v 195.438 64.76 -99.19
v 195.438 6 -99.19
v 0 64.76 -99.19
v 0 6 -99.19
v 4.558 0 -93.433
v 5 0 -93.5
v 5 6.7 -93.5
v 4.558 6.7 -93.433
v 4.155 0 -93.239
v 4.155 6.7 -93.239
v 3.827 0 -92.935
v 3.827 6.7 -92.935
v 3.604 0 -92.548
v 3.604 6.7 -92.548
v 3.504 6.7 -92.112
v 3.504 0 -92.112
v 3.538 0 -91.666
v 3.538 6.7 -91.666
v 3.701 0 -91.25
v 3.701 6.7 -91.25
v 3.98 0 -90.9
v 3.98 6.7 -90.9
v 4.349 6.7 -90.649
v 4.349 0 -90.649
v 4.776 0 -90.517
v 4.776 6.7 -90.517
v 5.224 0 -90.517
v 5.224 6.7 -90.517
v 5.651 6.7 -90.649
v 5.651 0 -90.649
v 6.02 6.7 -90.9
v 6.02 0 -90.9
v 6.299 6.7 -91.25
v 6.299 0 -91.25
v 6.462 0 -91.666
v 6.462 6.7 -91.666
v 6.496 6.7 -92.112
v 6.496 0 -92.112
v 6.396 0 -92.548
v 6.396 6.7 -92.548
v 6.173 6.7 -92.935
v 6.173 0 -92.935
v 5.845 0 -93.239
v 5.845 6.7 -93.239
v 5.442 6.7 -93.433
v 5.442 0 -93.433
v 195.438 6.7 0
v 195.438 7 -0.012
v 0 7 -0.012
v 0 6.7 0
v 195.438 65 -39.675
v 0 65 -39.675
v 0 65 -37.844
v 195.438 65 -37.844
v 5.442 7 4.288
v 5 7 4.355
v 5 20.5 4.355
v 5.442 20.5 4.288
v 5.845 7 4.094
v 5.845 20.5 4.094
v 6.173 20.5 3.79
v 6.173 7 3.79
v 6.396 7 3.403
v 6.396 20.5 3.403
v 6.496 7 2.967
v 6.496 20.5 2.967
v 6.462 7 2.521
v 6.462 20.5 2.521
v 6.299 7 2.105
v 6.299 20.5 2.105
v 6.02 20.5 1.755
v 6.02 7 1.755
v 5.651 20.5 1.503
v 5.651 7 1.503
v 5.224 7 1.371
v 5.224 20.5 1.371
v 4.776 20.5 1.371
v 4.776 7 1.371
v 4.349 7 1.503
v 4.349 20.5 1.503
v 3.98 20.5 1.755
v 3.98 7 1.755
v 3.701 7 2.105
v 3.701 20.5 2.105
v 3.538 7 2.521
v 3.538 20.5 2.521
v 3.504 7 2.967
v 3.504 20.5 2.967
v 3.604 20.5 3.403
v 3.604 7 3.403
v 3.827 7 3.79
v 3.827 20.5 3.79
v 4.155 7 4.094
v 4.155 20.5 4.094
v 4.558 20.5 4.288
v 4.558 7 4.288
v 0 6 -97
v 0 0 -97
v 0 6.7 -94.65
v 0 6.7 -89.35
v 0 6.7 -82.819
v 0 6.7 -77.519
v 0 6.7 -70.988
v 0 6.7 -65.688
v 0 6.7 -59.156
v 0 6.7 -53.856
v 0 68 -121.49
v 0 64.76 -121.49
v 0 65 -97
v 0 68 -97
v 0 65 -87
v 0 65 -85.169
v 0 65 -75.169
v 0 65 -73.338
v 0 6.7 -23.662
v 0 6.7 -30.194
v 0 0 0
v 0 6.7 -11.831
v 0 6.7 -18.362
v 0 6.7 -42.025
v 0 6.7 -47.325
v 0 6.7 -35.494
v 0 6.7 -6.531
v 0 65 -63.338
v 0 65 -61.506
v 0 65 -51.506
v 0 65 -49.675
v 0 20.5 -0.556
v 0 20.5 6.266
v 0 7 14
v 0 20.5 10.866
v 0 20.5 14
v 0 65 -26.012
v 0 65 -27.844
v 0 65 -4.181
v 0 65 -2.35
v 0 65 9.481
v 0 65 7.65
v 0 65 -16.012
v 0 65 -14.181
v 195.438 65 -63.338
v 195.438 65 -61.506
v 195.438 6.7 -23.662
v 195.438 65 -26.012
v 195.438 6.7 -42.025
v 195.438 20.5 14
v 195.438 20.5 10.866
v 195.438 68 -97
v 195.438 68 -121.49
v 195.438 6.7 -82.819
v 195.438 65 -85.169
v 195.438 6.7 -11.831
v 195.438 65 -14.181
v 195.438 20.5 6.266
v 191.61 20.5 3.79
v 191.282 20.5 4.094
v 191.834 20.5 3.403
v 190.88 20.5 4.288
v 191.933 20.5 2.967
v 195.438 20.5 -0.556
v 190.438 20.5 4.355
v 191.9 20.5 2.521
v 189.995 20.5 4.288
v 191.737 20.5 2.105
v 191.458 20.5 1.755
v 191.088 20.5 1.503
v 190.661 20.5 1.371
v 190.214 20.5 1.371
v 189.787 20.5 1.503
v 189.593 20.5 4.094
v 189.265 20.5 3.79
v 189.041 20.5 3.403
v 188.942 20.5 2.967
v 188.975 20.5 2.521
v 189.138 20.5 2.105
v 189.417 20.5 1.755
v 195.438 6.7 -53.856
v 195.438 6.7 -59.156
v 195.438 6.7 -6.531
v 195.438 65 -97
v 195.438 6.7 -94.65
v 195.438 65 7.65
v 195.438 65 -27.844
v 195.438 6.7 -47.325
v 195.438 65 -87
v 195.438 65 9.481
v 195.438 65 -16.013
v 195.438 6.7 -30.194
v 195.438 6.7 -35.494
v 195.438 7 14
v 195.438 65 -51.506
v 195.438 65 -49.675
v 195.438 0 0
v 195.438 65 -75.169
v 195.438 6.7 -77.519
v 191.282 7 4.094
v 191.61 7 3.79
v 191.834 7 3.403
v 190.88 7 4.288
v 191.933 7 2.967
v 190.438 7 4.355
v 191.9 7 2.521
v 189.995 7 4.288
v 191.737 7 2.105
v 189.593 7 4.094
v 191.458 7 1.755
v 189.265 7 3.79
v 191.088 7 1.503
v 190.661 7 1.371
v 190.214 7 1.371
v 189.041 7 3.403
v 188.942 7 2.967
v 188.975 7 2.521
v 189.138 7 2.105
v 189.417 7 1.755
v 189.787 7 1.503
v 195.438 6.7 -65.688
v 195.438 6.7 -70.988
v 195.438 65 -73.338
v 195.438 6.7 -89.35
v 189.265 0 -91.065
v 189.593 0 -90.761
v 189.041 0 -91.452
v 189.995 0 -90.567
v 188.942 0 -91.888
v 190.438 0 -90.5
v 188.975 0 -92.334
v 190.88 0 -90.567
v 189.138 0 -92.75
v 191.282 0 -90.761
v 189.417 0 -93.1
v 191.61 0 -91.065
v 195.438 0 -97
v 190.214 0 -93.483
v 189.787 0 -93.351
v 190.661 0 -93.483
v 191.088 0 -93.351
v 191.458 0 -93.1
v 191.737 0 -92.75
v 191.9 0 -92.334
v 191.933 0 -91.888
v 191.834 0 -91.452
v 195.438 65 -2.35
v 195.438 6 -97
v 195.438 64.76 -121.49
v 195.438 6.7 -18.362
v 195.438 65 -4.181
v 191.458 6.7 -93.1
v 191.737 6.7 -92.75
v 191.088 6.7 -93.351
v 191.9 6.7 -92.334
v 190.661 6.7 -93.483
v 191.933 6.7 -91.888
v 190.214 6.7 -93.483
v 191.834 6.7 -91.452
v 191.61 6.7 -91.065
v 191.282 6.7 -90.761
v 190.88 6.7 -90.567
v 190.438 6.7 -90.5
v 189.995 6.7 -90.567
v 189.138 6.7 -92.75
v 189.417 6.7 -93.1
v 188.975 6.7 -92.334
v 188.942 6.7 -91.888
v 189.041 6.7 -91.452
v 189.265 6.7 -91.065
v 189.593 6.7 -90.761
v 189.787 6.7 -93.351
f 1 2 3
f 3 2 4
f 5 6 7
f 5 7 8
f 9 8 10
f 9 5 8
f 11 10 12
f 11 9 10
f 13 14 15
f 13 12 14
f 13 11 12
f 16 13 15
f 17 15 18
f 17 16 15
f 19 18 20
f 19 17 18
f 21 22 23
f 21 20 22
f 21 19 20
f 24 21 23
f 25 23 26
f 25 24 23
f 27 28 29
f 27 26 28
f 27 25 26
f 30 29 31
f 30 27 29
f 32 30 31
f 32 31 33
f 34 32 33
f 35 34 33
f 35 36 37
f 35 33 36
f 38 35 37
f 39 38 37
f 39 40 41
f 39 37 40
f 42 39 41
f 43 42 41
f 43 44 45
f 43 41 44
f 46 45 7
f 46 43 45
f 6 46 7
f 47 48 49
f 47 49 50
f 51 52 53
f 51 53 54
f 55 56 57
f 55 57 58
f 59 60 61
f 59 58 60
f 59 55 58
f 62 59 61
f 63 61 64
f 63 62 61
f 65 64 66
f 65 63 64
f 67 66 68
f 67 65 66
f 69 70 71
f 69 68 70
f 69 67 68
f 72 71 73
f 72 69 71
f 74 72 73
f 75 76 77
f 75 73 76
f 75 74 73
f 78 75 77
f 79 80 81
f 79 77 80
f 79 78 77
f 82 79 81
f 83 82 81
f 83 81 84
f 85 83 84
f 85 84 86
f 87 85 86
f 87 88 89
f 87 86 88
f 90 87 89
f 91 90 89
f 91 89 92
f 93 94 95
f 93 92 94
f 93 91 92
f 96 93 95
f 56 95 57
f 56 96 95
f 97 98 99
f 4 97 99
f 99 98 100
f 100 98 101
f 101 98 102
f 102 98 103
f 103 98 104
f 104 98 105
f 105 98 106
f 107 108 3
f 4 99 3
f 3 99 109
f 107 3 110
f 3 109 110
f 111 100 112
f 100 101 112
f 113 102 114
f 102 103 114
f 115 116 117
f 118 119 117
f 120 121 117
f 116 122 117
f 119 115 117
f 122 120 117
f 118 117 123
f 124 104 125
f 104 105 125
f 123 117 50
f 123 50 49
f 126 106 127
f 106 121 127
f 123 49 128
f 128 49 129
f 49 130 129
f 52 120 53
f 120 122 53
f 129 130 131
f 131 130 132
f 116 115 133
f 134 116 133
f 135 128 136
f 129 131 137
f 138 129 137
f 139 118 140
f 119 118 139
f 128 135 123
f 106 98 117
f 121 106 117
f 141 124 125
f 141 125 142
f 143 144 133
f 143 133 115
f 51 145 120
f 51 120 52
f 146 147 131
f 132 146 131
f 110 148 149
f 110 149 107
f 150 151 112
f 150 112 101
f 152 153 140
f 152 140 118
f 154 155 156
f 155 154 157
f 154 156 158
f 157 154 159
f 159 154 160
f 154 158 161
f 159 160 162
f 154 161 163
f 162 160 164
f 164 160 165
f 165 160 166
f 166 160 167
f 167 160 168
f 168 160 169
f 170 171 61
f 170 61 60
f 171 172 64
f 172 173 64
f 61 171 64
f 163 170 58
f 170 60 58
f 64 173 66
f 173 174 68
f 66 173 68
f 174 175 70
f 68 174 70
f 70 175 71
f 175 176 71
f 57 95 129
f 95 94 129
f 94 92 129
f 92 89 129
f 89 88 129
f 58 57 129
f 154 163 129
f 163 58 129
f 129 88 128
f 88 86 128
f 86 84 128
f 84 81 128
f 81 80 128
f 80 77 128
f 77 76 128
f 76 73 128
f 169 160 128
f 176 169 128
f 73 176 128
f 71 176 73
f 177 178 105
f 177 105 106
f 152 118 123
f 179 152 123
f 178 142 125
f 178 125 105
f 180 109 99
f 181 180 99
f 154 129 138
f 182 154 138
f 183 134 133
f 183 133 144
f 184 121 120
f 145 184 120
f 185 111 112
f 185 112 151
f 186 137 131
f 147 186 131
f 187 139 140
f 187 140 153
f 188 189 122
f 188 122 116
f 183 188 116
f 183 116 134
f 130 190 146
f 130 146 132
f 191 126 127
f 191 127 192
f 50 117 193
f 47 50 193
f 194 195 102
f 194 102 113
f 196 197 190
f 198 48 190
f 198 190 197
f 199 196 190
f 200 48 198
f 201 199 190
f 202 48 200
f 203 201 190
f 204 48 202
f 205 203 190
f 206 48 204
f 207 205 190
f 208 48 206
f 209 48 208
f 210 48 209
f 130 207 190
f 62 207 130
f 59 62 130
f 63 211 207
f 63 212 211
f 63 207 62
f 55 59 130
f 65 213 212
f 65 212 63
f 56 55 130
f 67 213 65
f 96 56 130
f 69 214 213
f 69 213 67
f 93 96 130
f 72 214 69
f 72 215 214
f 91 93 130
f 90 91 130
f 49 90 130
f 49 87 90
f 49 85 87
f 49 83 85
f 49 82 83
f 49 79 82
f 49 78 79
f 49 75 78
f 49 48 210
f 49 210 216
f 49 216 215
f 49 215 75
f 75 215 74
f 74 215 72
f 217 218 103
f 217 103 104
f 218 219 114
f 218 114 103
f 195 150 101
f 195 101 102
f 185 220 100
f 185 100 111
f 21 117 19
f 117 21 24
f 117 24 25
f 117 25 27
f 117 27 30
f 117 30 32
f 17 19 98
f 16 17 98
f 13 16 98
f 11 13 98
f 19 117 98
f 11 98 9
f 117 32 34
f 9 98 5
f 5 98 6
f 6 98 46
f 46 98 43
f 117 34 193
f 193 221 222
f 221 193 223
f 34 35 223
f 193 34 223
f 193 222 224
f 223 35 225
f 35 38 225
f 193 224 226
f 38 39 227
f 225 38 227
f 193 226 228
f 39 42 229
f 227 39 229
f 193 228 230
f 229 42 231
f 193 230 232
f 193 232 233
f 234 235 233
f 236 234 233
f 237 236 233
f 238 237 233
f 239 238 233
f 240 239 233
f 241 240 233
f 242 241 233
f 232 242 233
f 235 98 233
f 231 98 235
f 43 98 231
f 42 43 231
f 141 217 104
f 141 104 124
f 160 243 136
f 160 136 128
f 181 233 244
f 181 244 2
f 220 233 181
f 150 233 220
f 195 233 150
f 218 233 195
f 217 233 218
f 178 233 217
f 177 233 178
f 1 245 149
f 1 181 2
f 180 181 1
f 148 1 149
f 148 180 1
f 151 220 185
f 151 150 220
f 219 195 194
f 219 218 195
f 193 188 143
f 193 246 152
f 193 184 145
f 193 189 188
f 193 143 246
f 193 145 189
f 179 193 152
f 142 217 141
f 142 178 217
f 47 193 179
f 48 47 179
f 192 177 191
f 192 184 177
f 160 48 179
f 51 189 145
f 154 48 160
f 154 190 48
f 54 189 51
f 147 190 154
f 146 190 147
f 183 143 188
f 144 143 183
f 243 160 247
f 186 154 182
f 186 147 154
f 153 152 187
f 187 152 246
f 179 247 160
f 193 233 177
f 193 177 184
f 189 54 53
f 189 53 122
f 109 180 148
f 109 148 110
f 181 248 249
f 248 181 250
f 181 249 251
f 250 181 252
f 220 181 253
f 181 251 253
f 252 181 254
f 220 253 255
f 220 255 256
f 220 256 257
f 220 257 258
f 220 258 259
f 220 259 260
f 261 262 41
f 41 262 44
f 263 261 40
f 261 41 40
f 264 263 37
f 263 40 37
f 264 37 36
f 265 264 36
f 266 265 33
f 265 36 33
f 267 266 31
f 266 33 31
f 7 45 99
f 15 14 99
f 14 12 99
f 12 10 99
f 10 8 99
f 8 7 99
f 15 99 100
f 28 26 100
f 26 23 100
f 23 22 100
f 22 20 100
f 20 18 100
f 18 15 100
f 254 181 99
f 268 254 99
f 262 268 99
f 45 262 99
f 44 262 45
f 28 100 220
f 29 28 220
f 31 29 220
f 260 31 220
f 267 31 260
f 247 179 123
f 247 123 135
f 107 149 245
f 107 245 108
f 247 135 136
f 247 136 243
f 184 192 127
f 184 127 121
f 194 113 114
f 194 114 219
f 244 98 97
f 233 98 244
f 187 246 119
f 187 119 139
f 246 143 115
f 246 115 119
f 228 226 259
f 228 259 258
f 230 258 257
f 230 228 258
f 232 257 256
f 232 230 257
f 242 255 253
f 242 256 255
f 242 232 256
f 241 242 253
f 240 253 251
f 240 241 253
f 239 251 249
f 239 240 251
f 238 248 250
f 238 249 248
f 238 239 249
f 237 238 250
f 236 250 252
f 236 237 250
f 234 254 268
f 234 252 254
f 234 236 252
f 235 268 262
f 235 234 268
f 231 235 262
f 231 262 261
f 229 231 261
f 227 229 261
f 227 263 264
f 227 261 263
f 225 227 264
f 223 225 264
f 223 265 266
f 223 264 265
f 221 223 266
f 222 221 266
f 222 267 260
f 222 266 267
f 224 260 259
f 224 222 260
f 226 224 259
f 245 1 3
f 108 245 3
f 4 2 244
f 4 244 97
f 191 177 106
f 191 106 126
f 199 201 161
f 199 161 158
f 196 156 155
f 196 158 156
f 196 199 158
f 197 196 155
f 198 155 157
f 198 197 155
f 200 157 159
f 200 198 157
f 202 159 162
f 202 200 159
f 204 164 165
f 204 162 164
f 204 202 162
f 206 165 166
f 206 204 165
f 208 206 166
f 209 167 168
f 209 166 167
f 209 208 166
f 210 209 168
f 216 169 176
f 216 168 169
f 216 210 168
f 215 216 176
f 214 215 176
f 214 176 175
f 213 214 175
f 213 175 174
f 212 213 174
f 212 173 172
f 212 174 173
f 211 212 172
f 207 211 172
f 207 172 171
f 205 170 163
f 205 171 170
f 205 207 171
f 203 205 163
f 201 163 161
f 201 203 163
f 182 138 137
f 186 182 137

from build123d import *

# Parameters (mm, degrees)
SKETCH1_W               = 195.4375
SKETCH1_H               = 97
BOSS_EXTRUDE1_DEPTH     = 65
CUT_EXTRUDE1_DEPTH      = 228.661626996
SKETCH4_W               = 195.4375
SKETCH4_H               = 15
BOSS_EXTRUDE2_DEPTH     = 13.5
BOSS_EXTRUDE3_DEPTH     = 195.4375
SKETCH6_W               = 195.4375
SKETCH6_H               = 2.19
BOSS_EXTRUDE4_DEPTH     = 62
SKETCH7_W               = 195.4375
SKETCH7_H               = 3.24
BOSS_EXTRUDE5_DEPTH     = 22.3
CUT_EXTRUDE2_DEPTH      = 239.145599385
CUT_EXTRUDE2_DEPTH_BACK = 239.145599385
SKETCH8_R               = 1.5


with BuildPart() as part:
    # Sketch1 → Boss-Extrude1 (new body)
    with BuildSketch(Plane(origin=(0, 0, 0), x_dir=(1, 0, 0), z_dir=(0, 1, 0))):
        with Locations((97.71875, 48.5)):
            Rectangle(SKETCH1_W, SKETCH1_H)
    extrude(amount=BOSS_EXTRUDE1_DEPTH)

    # Sketch2 → Cut-Extrude1 (cut, through all)
    with BuildSketch(Plane.ZY):
        Polygon((-97, 65), (-94.65, 6.7), (-89.35, 6.7), (-87, 65), align=None)
        Polygon((-75.16875, 65), (-85.16875, 65), (-82.81875, 6.7), (-77.51875, 6.7), align=None)
        Polygon((-63.3375, 65), (-73.3375, 65), (-70.9875, 6.7), (-65.6875, 6.7), align=None)
        Polygon((-51.50625, 65), (-61.50625, 65), (-59.15625, 6.7), (-53.85625, 6.7), align=None)
        Polygon((-39.675, 65), (-49.675, 65), (-47.325, 6.7), (-42.025, 6.7), align=None)
        Polygon((-27.84375, 65), (-37.84375, 65), (-35.49375, 6.7), (-30.19375, 6.7), align=None)
        Polygon((-16.0125, 65), (-26.0125, 65), (-23.6625, 6.7), (-18.3625, 6.7), align=None)
        Polygon((-4.18125, 65), (-14.18125, 65), (-11.83125, 6.7), (-6.53125, 6.7), align=None)
        Polygon((7.65, 65), (-2.35, 65), (0, 6.7), (5.3, 6.7), align=None)
    extrude(amount=-CUT_EXTRUDE1_DEPTH, mode=Mode.SUBTRACT)

    # Sketch4 → Boss-Extrude2 (add)
    with BuildSketch(Plane(origin=(0, 7, 0), x_dir=(-1, 0, 0), z_dir=(0, -1, 0))):
        with Locations((-97.71875, -6.5)):
            Rectangle(SKETCH4_W, SKETCH4_H)
    extrude(amount=-BOSS_EXTRUDE2_DEPTH)

    # Sketch5 → Boss-Extrude3 (add)
    with BuildSketch(Plane.ZY):
        Polygon((6.265625, 20.5), (7.65, 65), (9.48125, 65), (10.865625, 20.5), align=None)
    extrude(amount=-BOSS_EXTRUDE3_DEPTH)

    # Sketch6 → Boss-Extrude4 (add)
    with BuildSketch(Plane(origin=(0, 6, 0), x_dir=(-1, 0, 0), z_dir=(0, -1, 0))):
        with Locations((-97.71875, 98.095)):
            Rectangle(SKETCH6_W, SKETCH6_H)
    extrude(amount=-BOSS_EXTRUDE4_DEPTH)

    # Sketch7 → Boss-Extrude5 (add)
    with BuildSketch(Plane(origin=(0, 0, -99.19), x_dir=(-1, 0, 0), z_dir=(0, 0, -1))):
        with Locations((-97.71875, 66.38)):
            Rectangle(SKETCH7_W, SKETCH7_H)
    extrude(amount=BOSS_EXTRUDE5_DEPTH)

    # Sketch8 → Cut-Extrude2 (cut, two sides: drawn at the far end of the back side and taken through both)
    with BuildSketch(Plane(origin=(0, 6.7, 0), x_dir=(1, 0, 0), z_dir=(0, 1, 0)).offset(-CUT_EXTRUDE2_DEPTH_BACK)):
        with Locations(Location((190.4375, 92, 0), (0, 0, 270))):
            Circle(SKETCH8_R)
        with Locations(Location((190.4375, -2.85468214, 0), (0, 0, 270))):
            Circle(SKETCH8_R)
        with Locations(Location((5, 92, 0), (0, 0, 90))):
            Circle(SKETCH8_R)
        with Locations(Location((5, -2.85468214, 0), (0, 0, 270))):
            Circle(SKETCH8_R)
    extrude(amount=CUT_EXTRUDE2_DEPTH + CUT_EXTRUDE2_DEPTH_BACK, mode=Mode.SUBTRACT)


solid = part.part
